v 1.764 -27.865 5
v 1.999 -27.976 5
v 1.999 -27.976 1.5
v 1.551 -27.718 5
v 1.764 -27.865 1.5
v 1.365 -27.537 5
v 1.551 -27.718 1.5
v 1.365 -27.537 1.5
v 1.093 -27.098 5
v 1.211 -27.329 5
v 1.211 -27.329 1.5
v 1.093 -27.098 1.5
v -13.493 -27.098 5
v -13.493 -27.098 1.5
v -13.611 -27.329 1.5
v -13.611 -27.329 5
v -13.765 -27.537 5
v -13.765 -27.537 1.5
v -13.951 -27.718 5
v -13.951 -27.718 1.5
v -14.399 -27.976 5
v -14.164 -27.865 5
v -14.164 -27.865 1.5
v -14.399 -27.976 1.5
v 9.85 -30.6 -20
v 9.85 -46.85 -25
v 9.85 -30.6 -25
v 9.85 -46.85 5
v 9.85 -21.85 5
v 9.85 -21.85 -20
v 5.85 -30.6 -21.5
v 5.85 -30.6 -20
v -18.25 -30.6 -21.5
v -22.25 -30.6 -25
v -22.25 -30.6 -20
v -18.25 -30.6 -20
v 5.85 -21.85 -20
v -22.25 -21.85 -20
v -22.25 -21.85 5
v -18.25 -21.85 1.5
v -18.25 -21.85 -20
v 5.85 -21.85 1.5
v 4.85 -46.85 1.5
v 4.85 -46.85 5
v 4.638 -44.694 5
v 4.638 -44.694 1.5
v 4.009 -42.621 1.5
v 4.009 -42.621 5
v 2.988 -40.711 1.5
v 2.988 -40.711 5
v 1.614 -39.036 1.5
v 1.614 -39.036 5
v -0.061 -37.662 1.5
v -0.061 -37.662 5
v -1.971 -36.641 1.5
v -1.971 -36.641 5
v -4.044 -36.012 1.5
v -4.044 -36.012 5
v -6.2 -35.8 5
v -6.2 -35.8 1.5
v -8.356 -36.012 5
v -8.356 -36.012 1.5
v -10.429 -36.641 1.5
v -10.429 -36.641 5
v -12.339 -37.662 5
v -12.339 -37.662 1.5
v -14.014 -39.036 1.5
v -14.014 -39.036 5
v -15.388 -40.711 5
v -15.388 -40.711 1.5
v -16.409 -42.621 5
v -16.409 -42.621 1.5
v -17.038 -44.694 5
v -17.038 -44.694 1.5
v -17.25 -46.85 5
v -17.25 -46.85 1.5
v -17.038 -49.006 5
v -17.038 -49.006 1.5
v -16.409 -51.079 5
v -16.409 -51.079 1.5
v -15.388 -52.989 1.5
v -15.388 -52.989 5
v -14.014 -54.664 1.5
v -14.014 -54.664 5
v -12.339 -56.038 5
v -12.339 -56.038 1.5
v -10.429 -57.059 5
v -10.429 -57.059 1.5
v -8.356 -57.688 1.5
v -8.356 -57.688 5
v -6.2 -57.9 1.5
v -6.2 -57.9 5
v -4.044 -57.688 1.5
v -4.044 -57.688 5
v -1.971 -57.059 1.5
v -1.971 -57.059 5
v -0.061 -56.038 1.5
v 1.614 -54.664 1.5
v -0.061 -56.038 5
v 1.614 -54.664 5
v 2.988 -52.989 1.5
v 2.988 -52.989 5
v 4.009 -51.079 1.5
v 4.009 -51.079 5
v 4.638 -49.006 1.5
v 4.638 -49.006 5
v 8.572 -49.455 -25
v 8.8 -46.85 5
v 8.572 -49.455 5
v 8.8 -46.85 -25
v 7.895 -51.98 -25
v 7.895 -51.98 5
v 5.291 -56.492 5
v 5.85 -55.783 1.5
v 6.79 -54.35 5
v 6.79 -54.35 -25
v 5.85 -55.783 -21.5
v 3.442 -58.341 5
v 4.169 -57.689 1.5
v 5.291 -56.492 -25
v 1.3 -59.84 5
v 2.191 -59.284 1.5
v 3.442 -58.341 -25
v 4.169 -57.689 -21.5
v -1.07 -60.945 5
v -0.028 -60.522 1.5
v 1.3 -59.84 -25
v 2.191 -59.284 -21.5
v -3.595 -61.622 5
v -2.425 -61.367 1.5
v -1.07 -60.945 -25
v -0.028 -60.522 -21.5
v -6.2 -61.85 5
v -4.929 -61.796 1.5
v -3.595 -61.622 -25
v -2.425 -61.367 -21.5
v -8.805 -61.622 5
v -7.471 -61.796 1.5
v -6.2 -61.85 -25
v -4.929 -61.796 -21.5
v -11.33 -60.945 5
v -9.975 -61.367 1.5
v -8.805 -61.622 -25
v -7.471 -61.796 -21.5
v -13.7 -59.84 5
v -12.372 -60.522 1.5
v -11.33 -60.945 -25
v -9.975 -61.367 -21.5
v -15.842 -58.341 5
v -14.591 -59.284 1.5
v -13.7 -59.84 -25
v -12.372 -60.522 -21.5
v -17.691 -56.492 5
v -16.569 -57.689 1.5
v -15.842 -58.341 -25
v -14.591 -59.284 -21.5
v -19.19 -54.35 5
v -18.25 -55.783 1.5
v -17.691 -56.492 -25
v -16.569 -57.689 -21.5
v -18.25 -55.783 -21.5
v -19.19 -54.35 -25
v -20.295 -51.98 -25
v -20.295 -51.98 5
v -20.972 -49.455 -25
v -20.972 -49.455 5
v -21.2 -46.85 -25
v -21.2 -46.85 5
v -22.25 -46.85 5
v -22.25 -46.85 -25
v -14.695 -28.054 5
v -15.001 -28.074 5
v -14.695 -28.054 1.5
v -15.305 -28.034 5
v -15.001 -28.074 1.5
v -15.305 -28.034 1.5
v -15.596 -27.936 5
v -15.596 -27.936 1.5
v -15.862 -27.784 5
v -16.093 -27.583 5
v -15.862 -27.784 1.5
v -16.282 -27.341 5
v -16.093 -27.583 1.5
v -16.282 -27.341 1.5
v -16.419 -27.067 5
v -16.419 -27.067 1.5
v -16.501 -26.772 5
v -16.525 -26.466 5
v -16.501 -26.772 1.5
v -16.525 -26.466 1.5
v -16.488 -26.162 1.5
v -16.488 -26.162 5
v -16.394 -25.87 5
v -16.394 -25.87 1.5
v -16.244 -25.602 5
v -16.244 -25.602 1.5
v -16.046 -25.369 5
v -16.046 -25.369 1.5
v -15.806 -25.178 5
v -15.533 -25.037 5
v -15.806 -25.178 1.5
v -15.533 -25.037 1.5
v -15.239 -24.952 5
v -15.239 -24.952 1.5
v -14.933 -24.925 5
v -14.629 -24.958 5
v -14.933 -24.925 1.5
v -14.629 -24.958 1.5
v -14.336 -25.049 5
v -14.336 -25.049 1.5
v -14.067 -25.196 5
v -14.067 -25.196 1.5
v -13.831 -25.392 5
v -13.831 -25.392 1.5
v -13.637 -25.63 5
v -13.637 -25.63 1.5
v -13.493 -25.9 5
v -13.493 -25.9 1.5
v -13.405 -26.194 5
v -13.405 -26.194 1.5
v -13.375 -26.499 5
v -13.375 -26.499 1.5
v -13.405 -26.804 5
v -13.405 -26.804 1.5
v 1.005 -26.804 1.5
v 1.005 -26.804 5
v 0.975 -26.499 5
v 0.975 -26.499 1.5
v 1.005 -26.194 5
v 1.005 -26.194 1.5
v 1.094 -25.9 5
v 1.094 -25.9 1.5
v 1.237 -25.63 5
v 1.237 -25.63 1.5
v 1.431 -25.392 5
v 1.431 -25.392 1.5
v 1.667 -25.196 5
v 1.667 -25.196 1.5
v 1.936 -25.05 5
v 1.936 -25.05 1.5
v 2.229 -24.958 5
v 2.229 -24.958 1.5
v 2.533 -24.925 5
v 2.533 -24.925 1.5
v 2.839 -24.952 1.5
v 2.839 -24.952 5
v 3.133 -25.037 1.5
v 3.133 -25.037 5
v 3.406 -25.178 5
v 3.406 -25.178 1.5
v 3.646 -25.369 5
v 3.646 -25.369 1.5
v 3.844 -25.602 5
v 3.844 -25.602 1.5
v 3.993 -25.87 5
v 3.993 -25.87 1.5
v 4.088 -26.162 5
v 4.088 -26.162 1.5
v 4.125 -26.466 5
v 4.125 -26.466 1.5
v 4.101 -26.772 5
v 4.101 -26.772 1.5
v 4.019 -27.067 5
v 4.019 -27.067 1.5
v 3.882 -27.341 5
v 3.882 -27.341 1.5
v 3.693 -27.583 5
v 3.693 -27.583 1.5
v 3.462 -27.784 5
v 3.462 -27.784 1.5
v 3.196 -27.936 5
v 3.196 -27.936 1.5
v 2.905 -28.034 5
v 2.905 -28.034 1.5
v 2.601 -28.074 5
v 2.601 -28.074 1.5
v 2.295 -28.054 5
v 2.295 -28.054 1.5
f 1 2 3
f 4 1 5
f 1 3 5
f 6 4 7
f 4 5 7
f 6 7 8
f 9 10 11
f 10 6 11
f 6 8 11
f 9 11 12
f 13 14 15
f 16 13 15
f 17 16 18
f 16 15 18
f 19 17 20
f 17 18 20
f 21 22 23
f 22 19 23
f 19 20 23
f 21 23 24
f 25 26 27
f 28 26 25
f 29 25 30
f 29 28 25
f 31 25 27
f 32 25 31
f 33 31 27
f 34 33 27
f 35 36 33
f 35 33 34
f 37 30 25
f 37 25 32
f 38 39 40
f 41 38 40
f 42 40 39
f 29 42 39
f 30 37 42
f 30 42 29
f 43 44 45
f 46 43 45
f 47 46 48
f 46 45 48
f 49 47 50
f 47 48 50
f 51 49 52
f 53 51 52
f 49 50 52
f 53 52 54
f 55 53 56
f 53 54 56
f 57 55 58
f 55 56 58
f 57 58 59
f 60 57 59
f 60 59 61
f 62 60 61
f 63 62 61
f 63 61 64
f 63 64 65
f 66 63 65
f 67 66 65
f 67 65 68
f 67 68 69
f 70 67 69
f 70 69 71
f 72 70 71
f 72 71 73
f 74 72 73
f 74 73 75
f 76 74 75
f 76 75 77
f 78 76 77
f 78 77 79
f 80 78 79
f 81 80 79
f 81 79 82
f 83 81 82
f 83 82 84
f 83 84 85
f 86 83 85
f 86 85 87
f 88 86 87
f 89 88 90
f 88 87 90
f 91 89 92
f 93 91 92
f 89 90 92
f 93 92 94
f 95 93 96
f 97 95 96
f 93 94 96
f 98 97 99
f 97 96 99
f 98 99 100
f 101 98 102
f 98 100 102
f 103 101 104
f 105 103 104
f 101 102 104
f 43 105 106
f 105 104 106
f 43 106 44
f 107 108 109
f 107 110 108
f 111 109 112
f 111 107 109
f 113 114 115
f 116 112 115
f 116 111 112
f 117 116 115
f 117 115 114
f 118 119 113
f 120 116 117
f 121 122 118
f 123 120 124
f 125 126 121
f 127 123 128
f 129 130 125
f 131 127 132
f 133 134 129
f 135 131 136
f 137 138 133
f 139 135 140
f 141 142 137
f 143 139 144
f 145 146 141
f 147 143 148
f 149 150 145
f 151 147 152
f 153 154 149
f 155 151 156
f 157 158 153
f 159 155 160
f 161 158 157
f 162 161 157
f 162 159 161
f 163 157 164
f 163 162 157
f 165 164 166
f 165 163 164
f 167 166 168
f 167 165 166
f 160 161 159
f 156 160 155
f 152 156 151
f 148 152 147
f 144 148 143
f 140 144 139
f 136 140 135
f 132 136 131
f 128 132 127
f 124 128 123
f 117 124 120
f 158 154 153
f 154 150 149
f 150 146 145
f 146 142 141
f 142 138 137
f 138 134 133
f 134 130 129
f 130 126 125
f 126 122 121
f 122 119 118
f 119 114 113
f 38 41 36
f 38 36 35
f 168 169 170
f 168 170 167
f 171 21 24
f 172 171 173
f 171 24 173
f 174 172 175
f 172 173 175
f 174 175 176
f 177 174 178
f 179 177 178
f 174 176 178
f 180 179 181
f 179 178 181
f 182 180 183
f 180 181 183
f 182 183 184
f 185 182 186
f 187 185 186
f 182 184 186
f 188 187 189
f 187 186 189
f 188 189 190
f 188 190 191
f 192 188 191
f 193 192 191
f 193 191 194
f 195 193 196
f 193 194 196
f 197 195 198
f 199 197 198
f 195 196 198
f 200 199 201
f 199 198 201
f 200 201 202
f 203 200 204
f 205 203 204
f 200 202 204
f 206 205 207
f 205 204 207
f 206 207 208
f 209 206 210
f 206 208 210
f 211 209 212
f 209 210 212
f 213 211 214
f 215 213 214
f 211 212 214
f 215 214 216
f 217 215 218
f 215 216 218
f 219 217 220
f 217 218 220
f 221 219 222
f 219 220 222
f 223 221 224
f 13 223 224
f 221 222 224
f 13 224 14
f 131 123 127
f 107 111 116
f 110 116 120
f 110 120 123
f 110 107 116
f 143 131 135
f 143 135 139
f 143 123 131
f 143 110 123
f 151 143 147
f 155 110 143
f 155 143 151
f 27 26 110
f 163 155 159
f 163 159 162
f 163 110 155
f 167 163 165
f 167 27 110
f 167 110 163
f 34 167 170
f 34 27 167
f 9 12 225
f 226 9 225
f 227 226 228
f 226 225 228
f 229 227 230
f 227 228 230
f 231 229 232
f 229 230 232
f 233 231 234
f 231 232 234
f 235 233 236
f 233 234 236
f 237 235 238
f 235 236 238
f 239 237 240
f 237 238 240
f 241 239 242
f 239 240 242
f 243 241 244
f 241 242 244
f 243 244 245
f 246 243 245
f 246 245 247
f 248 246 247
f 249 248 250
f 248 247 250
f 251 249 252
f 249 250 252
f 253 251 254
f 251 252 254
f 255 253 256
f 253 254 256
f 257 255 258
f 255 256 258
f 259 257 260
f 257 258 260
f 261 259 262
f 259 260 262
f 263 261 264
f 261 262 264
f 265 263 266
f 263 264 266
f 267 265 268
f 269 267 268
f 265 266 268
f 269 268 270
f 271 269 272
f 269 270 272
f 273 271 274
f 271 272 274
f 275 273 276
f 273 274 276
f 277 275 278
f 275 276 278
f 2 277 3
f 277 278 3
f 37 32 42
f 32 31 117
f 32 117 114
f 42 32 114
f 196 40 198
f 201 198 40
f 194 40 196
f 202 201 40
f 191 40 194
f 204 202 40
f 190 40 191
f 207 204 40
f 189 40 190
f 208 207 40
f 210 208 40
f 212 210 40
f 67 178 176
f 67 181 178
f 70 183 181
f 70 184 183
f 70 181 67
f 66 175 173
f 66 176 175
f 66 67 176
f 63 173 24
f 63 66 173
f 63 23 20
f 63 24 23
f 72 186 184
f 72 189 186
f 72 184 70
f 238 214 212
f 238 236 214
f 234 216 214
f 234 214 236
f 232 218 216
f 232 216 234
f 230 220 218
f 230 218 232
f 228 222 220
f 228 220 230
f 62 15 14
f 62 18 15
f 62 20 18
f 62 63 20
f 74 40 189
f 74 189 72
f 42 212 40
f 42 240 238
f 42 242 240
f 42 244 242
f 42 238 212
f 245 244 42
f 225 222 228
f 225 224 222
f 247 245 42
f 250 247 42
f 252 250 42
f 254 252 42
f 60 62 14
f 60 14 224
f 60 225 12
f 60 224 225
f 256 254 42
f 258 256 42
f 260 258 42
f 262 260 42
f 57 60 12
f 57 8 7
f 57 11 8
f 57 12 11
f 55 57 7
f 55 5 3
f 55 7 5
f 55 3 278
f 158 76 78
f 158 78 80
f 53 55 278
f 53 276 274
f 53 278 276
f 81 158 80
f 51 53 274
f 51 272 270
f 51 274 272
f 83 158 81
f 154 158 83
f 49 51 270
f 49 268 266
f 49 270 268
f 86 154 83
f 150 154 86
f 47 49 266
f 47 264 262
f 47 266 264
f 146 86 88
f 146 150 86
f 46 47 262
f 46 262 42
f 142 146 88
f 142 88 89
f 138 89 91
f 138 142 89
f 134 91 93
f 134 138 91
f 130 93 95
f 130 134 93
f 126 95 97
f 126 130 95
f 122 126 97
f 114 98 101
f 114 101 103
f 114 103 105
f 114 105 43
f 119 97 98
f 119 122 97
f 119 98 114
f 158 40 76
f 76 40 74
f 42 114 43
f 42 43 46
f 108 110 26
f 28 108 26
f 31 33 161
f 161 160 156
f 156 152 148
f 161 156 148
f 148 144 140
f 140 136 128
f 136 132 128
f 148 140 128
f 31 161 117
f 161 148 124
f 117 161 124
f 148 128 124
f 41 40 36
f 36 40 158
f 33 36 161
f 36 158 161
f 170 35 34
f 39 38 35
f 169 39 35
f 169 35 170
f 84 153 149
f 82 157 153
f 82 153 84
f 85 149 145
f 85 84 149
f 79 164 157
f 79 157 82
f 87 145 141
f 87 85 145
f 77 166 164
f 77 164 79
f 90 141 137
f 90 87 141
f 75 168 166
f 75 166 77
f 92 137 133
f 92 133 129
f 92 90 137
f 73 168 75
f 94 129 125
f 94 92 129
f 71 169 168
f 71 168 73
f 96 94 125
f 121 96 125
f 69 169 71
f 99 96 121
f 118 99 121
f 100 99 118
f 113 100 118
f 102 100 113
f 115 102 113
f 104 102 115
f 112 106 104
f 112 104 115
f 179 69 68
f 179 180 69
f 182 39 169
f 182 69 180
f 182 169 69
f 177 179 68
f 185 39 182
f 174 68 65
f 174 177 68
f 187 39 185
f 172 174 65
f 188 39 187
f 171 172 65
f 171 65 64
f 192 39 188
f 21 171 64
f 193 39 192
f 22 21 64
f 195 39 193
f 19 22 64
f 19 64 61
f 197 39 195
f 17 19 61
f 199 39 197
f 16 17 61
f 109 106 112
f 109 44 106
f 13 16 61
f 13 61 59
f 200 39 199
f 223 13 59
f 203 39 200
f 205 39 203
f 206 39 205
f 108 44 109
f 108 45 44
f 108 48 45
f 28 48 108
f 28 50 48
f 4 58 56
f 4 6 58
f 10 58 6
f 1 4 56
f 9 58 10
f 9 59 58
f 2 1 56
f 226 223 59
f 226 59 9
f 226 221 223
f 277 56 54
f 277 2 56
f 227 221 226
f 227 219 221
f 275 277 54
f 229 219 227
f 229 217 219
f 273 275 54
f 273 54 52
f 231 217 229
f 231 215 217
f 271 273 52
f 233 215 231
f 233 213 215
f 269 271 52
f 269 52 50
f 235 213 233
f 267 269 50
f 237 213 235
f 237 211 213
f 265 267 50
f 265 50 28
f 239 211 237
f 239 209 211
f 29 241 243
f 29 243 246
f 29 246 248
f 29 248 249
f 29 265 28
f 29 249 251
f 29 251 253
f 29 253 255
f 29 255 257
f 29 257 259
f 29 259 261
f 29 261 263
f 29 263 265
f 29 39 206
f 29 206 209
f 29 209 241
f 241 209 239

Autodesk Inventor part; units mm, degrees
ref_plane "YZ Plane" through (0, 0, 0) normal (1, 0, 0) x (0, 1, 0)
ref_plane "XY Plane" through (0, 0, 0) normal (0, 0, 1) x (1, 0, 0)
sketch "Sketch1" plane through (0, 0, 0) normal (0, 0, 1) x (1, 0, 0)
  line L0 (-17.25, -31.85) -> (4.85, -31.85) projected
  line L1 (4.85, -31.85) -> (4.85, 0) projected
  arc A0 (4.85, 0) -> (0, 4.85) centre (0, 0) ccw projected
  line L2 (0, 4.85) -> (-12.4, 4.85) projected
  arc A1 (-12.4, 4.85) -> (-17.25, 0) centre (-12.4, 0) ccw projected
  line L3 (-17.25, 0) -> (-17.25, -31.85) projected
  circle A2 centre (-6.2, -6.5) radius 2.75 projected
  circle A3 centre (-6.2, -17.15) radius 1.95 projected
  arc A4 (1.9991, -27.9755) -> (1.0928, -27.0978) centre (2.55, -26.5) ccw projected
  arc A5 (1.0928, -27.0978) -> (1.9991, -27.9755) centre (-0.065, -29.2) ccw projected
  arc A6 (-13.4928, -27.0978) -> (-14.3991, -27.9755) centre (-14.95, -26.5) ccw projected
  arc A7 (-14.3991, -27.9755) -> (-13.4928, -27.0978) centre (-12.335, -29.2) ccw projected
  line L4 (9.85, -61.85) -> (-22.25, -61.85)
  line L5 (-22.25, -61.85) -> (-22.25, -21.85)
  line L6 (-22.25, -21.85) -> (9.85, -21.85)
  line L7 (9.85, -21.85) -> (9.85, -61.85)
  circle A8 centre (2.55, -26.5) radius 1.575
  circle A9 centre (-14.95, -26.5) radius 1.575
  point P0 (0, 0)
  point P1 (1.0928, -27.0978)
  point P2 (1.9991, -27.9755)
  point P3 (-17.25, -21.85)
  point P4 (4.85, -21.85)
  dimension "d2" = 5
  dimension "d3" = 5
  dimension "d12" = 10
  dimension "d13" = 40
extrude "Extrusion2" add sketch "Sketch1" along normal blind 5 contours L3 L6 L1 L0 | L0 L1 L6 L7 L4 L5 L3 | A5 A8 | A7 A9
sketch "Sketch2" plane through (0, 0, 0) normal (0, 0, -1) x (-1, 0, 0)
  line L0 (22.25, -21.85) -> (22.25, -61.85) projected
  line L1 (22.25, -61.85) -> (18.25, -61.85)
  line L2 (18.25, -61.85) -> (18.25, -21.85)
  line L3 (18.25, -21.85) -> (22.25, -21.85)
  line L4 (22.25, -21.85) -> (22.25, -61.85)
  line L5 (-9.85, -61.85) -> (-9.85, -21.85) projected
  line L6 (-9.85, -21.85) -> (22.25, -21.85) projected
  line L7 (-9.85, -61.85) -> (-5.85, -61.85)
  line L8 (-5.85, -61.85) -> (-5.85, -21.85)
  line L9 (-5.85, -21.85) -> (-9.85, -21.85)
  line L10 (-9.85, -21.85) -> (-9.85, -61.85)
  point P0 (0, 0)
  point P1 (-4.85, -21.85)
  point P2 (17.25, -21.85)
  point P3 (-9.85, -21.85)
  dimension "d8" = 4
  dimension "d9" = 4
extrude "Extrusion3" add sketch "Sketch2" along normal blind 20
sketch "Sketch3" plane through (0, 0, -20) normal (0, 0, -1) x (-1, 0, 0)
  circle A0 centre (-2.55, -26.5) radius 1.575 projected
  circle A1 centre (14.95, -26.5) radius 1.575 projected
  circle A2 centre (6.2, -6.5) radius 2.95 projected
  line L0 (-43.9339, 5.041) -> (56.0661, 5.041) projected
  line L1 (-23.9339, -29.6) -> (-43.9339, 5.041) projected
  line L2 (36.0661, -29.6) -> (-23.9339, -29.6) projected
  line L3 (56.0661, 5.041) -> (36.0661, -29.6) projected
  line L4 (22.25, -61.85) -> (-9.85, -61.85) projected
  line L5 (-9.85, -61.85) -> (-9.85, -21.85) projected
  line L6 (22.25, -61.85) -> (-9.85, -61.85)
  line L7 (-9.85, -61.85) -> (-9.85, -30.6)
  line L8 (-9.85, -30.6) -> (22.25, -30.6)
  line L9 (22.25, -30.6) -> (22.25, -61.85)
  point P0 (0, 0)
  dimension "d14" = 1
extrude "Extrusion4" add sketch "Sketch3" along normal blind 5 contours L8 L9 L4 L5
sketch "Sketch4" plane through (0, 0, 5) normal (0, 0, 1) x (1, 0, 0)
  circle A0 centre (-6.2, -46.85) radius 11.05
  line L0 (-22.25, -21.85) -> (-22.25, -61.85) projected
  line L1 (-22.25, -61.85) -> (9.85, -61.85) projected
  point P0 (0, 0)
  dimension "d17" = 22.1
  dimension "d18" = 16.05
  dimension "d19" = 15
extrude "Extrusion5" cut sketch "Sketch4" against normal up to surface (5 mm away)
sketch "Sketch5" plane through (0, 0, -25) normal (0, 0, -1) x (-1, 0, 0)
  circle A0 centre (6.2, -46.85) radius 4.508
  circle A1 centre (6.2, -46.85) radius 15
  line L0 (22.25, -21.85) -> (22.25, -61.85) projected
  line L1 (22.25, -46.85) -> (-9.85, -46.85)
  line L2 (-9.85, -61.85) -> (-9.85, -21.85) projected
  line L3 (22.25, -46.85) -> (22.25, -61.85)
  line L4 (22.25, -61.85) -> (-9.85, -61.85)
  line L5 (-9.85, -46.85) -> (-9.85, -61.85)
  point P0 (0, 0)
  point P1 (6.2, -61.85)
  point P2 (21.2, -46.85)
  point P3 (-8.8, -46.85)
  dimension "d22" = 30
extrude "Extrusion6" cut sketch "Sketch5" against normal up to surface (30 mm away) contours L1 L0 L4 A1 | A1 L4 L2 L1
ref_plane "Work Plane1" through (-6.2, -61.85, -25) normal (0, 1, 0) x (-1, 0, 0)
sketch "Sketch6" plane through (-6.2, -61.85, -25) normal (0, 1, 0) x (-1, 0, 0)
  line L0 (-15, 0) -> (15, 0) projected
  line L1 (-15, 0) -> (-15, 30) projected
  line L2 (15, 30) -> (-15, 30) projected
  line L3 (15, 0) -> (15, 30) projected
  line L4 (12.05, 5) -> (-12.05, 5) projected
  line L5 (12.05, 25) -> (12.05, 5) projected
  line L6 (-12.05, 25) -> (12.05, 25) projected
  line L7 (-12.05, 5) -> (-12.05, 25) projected
  line L8 (-12.05, 25) -> (12.05, 25)
  line L9 (12.05, 25) -> (12.05, 26.5)
  line L10 (12.05, 26.5) -> (-12.05, 26.5)
  line L11 (-12.05, 26.5) -> (-12.05, 25)
  line L12 (-12.05, 5) -> (12.05, 5)
  line L13 (12.05, 5) -> (12.05, 3.5)
  line L14 (12.05, 3.5) -> (-12.05, 3.5)
  line L15 (-12.05, 3.5) -> (-12.05, 5)
  point P0 (-6.2, 25)
  dimension "d25" = 1.5
  dimension "d26" = 1.5
extrude "Extrusion7" cut sketch "Sketch6" along normal up to surface (40 mm away) contours L13 L14 L15 L4 | L6 L11 L10 L9
properties part number "arm1"
